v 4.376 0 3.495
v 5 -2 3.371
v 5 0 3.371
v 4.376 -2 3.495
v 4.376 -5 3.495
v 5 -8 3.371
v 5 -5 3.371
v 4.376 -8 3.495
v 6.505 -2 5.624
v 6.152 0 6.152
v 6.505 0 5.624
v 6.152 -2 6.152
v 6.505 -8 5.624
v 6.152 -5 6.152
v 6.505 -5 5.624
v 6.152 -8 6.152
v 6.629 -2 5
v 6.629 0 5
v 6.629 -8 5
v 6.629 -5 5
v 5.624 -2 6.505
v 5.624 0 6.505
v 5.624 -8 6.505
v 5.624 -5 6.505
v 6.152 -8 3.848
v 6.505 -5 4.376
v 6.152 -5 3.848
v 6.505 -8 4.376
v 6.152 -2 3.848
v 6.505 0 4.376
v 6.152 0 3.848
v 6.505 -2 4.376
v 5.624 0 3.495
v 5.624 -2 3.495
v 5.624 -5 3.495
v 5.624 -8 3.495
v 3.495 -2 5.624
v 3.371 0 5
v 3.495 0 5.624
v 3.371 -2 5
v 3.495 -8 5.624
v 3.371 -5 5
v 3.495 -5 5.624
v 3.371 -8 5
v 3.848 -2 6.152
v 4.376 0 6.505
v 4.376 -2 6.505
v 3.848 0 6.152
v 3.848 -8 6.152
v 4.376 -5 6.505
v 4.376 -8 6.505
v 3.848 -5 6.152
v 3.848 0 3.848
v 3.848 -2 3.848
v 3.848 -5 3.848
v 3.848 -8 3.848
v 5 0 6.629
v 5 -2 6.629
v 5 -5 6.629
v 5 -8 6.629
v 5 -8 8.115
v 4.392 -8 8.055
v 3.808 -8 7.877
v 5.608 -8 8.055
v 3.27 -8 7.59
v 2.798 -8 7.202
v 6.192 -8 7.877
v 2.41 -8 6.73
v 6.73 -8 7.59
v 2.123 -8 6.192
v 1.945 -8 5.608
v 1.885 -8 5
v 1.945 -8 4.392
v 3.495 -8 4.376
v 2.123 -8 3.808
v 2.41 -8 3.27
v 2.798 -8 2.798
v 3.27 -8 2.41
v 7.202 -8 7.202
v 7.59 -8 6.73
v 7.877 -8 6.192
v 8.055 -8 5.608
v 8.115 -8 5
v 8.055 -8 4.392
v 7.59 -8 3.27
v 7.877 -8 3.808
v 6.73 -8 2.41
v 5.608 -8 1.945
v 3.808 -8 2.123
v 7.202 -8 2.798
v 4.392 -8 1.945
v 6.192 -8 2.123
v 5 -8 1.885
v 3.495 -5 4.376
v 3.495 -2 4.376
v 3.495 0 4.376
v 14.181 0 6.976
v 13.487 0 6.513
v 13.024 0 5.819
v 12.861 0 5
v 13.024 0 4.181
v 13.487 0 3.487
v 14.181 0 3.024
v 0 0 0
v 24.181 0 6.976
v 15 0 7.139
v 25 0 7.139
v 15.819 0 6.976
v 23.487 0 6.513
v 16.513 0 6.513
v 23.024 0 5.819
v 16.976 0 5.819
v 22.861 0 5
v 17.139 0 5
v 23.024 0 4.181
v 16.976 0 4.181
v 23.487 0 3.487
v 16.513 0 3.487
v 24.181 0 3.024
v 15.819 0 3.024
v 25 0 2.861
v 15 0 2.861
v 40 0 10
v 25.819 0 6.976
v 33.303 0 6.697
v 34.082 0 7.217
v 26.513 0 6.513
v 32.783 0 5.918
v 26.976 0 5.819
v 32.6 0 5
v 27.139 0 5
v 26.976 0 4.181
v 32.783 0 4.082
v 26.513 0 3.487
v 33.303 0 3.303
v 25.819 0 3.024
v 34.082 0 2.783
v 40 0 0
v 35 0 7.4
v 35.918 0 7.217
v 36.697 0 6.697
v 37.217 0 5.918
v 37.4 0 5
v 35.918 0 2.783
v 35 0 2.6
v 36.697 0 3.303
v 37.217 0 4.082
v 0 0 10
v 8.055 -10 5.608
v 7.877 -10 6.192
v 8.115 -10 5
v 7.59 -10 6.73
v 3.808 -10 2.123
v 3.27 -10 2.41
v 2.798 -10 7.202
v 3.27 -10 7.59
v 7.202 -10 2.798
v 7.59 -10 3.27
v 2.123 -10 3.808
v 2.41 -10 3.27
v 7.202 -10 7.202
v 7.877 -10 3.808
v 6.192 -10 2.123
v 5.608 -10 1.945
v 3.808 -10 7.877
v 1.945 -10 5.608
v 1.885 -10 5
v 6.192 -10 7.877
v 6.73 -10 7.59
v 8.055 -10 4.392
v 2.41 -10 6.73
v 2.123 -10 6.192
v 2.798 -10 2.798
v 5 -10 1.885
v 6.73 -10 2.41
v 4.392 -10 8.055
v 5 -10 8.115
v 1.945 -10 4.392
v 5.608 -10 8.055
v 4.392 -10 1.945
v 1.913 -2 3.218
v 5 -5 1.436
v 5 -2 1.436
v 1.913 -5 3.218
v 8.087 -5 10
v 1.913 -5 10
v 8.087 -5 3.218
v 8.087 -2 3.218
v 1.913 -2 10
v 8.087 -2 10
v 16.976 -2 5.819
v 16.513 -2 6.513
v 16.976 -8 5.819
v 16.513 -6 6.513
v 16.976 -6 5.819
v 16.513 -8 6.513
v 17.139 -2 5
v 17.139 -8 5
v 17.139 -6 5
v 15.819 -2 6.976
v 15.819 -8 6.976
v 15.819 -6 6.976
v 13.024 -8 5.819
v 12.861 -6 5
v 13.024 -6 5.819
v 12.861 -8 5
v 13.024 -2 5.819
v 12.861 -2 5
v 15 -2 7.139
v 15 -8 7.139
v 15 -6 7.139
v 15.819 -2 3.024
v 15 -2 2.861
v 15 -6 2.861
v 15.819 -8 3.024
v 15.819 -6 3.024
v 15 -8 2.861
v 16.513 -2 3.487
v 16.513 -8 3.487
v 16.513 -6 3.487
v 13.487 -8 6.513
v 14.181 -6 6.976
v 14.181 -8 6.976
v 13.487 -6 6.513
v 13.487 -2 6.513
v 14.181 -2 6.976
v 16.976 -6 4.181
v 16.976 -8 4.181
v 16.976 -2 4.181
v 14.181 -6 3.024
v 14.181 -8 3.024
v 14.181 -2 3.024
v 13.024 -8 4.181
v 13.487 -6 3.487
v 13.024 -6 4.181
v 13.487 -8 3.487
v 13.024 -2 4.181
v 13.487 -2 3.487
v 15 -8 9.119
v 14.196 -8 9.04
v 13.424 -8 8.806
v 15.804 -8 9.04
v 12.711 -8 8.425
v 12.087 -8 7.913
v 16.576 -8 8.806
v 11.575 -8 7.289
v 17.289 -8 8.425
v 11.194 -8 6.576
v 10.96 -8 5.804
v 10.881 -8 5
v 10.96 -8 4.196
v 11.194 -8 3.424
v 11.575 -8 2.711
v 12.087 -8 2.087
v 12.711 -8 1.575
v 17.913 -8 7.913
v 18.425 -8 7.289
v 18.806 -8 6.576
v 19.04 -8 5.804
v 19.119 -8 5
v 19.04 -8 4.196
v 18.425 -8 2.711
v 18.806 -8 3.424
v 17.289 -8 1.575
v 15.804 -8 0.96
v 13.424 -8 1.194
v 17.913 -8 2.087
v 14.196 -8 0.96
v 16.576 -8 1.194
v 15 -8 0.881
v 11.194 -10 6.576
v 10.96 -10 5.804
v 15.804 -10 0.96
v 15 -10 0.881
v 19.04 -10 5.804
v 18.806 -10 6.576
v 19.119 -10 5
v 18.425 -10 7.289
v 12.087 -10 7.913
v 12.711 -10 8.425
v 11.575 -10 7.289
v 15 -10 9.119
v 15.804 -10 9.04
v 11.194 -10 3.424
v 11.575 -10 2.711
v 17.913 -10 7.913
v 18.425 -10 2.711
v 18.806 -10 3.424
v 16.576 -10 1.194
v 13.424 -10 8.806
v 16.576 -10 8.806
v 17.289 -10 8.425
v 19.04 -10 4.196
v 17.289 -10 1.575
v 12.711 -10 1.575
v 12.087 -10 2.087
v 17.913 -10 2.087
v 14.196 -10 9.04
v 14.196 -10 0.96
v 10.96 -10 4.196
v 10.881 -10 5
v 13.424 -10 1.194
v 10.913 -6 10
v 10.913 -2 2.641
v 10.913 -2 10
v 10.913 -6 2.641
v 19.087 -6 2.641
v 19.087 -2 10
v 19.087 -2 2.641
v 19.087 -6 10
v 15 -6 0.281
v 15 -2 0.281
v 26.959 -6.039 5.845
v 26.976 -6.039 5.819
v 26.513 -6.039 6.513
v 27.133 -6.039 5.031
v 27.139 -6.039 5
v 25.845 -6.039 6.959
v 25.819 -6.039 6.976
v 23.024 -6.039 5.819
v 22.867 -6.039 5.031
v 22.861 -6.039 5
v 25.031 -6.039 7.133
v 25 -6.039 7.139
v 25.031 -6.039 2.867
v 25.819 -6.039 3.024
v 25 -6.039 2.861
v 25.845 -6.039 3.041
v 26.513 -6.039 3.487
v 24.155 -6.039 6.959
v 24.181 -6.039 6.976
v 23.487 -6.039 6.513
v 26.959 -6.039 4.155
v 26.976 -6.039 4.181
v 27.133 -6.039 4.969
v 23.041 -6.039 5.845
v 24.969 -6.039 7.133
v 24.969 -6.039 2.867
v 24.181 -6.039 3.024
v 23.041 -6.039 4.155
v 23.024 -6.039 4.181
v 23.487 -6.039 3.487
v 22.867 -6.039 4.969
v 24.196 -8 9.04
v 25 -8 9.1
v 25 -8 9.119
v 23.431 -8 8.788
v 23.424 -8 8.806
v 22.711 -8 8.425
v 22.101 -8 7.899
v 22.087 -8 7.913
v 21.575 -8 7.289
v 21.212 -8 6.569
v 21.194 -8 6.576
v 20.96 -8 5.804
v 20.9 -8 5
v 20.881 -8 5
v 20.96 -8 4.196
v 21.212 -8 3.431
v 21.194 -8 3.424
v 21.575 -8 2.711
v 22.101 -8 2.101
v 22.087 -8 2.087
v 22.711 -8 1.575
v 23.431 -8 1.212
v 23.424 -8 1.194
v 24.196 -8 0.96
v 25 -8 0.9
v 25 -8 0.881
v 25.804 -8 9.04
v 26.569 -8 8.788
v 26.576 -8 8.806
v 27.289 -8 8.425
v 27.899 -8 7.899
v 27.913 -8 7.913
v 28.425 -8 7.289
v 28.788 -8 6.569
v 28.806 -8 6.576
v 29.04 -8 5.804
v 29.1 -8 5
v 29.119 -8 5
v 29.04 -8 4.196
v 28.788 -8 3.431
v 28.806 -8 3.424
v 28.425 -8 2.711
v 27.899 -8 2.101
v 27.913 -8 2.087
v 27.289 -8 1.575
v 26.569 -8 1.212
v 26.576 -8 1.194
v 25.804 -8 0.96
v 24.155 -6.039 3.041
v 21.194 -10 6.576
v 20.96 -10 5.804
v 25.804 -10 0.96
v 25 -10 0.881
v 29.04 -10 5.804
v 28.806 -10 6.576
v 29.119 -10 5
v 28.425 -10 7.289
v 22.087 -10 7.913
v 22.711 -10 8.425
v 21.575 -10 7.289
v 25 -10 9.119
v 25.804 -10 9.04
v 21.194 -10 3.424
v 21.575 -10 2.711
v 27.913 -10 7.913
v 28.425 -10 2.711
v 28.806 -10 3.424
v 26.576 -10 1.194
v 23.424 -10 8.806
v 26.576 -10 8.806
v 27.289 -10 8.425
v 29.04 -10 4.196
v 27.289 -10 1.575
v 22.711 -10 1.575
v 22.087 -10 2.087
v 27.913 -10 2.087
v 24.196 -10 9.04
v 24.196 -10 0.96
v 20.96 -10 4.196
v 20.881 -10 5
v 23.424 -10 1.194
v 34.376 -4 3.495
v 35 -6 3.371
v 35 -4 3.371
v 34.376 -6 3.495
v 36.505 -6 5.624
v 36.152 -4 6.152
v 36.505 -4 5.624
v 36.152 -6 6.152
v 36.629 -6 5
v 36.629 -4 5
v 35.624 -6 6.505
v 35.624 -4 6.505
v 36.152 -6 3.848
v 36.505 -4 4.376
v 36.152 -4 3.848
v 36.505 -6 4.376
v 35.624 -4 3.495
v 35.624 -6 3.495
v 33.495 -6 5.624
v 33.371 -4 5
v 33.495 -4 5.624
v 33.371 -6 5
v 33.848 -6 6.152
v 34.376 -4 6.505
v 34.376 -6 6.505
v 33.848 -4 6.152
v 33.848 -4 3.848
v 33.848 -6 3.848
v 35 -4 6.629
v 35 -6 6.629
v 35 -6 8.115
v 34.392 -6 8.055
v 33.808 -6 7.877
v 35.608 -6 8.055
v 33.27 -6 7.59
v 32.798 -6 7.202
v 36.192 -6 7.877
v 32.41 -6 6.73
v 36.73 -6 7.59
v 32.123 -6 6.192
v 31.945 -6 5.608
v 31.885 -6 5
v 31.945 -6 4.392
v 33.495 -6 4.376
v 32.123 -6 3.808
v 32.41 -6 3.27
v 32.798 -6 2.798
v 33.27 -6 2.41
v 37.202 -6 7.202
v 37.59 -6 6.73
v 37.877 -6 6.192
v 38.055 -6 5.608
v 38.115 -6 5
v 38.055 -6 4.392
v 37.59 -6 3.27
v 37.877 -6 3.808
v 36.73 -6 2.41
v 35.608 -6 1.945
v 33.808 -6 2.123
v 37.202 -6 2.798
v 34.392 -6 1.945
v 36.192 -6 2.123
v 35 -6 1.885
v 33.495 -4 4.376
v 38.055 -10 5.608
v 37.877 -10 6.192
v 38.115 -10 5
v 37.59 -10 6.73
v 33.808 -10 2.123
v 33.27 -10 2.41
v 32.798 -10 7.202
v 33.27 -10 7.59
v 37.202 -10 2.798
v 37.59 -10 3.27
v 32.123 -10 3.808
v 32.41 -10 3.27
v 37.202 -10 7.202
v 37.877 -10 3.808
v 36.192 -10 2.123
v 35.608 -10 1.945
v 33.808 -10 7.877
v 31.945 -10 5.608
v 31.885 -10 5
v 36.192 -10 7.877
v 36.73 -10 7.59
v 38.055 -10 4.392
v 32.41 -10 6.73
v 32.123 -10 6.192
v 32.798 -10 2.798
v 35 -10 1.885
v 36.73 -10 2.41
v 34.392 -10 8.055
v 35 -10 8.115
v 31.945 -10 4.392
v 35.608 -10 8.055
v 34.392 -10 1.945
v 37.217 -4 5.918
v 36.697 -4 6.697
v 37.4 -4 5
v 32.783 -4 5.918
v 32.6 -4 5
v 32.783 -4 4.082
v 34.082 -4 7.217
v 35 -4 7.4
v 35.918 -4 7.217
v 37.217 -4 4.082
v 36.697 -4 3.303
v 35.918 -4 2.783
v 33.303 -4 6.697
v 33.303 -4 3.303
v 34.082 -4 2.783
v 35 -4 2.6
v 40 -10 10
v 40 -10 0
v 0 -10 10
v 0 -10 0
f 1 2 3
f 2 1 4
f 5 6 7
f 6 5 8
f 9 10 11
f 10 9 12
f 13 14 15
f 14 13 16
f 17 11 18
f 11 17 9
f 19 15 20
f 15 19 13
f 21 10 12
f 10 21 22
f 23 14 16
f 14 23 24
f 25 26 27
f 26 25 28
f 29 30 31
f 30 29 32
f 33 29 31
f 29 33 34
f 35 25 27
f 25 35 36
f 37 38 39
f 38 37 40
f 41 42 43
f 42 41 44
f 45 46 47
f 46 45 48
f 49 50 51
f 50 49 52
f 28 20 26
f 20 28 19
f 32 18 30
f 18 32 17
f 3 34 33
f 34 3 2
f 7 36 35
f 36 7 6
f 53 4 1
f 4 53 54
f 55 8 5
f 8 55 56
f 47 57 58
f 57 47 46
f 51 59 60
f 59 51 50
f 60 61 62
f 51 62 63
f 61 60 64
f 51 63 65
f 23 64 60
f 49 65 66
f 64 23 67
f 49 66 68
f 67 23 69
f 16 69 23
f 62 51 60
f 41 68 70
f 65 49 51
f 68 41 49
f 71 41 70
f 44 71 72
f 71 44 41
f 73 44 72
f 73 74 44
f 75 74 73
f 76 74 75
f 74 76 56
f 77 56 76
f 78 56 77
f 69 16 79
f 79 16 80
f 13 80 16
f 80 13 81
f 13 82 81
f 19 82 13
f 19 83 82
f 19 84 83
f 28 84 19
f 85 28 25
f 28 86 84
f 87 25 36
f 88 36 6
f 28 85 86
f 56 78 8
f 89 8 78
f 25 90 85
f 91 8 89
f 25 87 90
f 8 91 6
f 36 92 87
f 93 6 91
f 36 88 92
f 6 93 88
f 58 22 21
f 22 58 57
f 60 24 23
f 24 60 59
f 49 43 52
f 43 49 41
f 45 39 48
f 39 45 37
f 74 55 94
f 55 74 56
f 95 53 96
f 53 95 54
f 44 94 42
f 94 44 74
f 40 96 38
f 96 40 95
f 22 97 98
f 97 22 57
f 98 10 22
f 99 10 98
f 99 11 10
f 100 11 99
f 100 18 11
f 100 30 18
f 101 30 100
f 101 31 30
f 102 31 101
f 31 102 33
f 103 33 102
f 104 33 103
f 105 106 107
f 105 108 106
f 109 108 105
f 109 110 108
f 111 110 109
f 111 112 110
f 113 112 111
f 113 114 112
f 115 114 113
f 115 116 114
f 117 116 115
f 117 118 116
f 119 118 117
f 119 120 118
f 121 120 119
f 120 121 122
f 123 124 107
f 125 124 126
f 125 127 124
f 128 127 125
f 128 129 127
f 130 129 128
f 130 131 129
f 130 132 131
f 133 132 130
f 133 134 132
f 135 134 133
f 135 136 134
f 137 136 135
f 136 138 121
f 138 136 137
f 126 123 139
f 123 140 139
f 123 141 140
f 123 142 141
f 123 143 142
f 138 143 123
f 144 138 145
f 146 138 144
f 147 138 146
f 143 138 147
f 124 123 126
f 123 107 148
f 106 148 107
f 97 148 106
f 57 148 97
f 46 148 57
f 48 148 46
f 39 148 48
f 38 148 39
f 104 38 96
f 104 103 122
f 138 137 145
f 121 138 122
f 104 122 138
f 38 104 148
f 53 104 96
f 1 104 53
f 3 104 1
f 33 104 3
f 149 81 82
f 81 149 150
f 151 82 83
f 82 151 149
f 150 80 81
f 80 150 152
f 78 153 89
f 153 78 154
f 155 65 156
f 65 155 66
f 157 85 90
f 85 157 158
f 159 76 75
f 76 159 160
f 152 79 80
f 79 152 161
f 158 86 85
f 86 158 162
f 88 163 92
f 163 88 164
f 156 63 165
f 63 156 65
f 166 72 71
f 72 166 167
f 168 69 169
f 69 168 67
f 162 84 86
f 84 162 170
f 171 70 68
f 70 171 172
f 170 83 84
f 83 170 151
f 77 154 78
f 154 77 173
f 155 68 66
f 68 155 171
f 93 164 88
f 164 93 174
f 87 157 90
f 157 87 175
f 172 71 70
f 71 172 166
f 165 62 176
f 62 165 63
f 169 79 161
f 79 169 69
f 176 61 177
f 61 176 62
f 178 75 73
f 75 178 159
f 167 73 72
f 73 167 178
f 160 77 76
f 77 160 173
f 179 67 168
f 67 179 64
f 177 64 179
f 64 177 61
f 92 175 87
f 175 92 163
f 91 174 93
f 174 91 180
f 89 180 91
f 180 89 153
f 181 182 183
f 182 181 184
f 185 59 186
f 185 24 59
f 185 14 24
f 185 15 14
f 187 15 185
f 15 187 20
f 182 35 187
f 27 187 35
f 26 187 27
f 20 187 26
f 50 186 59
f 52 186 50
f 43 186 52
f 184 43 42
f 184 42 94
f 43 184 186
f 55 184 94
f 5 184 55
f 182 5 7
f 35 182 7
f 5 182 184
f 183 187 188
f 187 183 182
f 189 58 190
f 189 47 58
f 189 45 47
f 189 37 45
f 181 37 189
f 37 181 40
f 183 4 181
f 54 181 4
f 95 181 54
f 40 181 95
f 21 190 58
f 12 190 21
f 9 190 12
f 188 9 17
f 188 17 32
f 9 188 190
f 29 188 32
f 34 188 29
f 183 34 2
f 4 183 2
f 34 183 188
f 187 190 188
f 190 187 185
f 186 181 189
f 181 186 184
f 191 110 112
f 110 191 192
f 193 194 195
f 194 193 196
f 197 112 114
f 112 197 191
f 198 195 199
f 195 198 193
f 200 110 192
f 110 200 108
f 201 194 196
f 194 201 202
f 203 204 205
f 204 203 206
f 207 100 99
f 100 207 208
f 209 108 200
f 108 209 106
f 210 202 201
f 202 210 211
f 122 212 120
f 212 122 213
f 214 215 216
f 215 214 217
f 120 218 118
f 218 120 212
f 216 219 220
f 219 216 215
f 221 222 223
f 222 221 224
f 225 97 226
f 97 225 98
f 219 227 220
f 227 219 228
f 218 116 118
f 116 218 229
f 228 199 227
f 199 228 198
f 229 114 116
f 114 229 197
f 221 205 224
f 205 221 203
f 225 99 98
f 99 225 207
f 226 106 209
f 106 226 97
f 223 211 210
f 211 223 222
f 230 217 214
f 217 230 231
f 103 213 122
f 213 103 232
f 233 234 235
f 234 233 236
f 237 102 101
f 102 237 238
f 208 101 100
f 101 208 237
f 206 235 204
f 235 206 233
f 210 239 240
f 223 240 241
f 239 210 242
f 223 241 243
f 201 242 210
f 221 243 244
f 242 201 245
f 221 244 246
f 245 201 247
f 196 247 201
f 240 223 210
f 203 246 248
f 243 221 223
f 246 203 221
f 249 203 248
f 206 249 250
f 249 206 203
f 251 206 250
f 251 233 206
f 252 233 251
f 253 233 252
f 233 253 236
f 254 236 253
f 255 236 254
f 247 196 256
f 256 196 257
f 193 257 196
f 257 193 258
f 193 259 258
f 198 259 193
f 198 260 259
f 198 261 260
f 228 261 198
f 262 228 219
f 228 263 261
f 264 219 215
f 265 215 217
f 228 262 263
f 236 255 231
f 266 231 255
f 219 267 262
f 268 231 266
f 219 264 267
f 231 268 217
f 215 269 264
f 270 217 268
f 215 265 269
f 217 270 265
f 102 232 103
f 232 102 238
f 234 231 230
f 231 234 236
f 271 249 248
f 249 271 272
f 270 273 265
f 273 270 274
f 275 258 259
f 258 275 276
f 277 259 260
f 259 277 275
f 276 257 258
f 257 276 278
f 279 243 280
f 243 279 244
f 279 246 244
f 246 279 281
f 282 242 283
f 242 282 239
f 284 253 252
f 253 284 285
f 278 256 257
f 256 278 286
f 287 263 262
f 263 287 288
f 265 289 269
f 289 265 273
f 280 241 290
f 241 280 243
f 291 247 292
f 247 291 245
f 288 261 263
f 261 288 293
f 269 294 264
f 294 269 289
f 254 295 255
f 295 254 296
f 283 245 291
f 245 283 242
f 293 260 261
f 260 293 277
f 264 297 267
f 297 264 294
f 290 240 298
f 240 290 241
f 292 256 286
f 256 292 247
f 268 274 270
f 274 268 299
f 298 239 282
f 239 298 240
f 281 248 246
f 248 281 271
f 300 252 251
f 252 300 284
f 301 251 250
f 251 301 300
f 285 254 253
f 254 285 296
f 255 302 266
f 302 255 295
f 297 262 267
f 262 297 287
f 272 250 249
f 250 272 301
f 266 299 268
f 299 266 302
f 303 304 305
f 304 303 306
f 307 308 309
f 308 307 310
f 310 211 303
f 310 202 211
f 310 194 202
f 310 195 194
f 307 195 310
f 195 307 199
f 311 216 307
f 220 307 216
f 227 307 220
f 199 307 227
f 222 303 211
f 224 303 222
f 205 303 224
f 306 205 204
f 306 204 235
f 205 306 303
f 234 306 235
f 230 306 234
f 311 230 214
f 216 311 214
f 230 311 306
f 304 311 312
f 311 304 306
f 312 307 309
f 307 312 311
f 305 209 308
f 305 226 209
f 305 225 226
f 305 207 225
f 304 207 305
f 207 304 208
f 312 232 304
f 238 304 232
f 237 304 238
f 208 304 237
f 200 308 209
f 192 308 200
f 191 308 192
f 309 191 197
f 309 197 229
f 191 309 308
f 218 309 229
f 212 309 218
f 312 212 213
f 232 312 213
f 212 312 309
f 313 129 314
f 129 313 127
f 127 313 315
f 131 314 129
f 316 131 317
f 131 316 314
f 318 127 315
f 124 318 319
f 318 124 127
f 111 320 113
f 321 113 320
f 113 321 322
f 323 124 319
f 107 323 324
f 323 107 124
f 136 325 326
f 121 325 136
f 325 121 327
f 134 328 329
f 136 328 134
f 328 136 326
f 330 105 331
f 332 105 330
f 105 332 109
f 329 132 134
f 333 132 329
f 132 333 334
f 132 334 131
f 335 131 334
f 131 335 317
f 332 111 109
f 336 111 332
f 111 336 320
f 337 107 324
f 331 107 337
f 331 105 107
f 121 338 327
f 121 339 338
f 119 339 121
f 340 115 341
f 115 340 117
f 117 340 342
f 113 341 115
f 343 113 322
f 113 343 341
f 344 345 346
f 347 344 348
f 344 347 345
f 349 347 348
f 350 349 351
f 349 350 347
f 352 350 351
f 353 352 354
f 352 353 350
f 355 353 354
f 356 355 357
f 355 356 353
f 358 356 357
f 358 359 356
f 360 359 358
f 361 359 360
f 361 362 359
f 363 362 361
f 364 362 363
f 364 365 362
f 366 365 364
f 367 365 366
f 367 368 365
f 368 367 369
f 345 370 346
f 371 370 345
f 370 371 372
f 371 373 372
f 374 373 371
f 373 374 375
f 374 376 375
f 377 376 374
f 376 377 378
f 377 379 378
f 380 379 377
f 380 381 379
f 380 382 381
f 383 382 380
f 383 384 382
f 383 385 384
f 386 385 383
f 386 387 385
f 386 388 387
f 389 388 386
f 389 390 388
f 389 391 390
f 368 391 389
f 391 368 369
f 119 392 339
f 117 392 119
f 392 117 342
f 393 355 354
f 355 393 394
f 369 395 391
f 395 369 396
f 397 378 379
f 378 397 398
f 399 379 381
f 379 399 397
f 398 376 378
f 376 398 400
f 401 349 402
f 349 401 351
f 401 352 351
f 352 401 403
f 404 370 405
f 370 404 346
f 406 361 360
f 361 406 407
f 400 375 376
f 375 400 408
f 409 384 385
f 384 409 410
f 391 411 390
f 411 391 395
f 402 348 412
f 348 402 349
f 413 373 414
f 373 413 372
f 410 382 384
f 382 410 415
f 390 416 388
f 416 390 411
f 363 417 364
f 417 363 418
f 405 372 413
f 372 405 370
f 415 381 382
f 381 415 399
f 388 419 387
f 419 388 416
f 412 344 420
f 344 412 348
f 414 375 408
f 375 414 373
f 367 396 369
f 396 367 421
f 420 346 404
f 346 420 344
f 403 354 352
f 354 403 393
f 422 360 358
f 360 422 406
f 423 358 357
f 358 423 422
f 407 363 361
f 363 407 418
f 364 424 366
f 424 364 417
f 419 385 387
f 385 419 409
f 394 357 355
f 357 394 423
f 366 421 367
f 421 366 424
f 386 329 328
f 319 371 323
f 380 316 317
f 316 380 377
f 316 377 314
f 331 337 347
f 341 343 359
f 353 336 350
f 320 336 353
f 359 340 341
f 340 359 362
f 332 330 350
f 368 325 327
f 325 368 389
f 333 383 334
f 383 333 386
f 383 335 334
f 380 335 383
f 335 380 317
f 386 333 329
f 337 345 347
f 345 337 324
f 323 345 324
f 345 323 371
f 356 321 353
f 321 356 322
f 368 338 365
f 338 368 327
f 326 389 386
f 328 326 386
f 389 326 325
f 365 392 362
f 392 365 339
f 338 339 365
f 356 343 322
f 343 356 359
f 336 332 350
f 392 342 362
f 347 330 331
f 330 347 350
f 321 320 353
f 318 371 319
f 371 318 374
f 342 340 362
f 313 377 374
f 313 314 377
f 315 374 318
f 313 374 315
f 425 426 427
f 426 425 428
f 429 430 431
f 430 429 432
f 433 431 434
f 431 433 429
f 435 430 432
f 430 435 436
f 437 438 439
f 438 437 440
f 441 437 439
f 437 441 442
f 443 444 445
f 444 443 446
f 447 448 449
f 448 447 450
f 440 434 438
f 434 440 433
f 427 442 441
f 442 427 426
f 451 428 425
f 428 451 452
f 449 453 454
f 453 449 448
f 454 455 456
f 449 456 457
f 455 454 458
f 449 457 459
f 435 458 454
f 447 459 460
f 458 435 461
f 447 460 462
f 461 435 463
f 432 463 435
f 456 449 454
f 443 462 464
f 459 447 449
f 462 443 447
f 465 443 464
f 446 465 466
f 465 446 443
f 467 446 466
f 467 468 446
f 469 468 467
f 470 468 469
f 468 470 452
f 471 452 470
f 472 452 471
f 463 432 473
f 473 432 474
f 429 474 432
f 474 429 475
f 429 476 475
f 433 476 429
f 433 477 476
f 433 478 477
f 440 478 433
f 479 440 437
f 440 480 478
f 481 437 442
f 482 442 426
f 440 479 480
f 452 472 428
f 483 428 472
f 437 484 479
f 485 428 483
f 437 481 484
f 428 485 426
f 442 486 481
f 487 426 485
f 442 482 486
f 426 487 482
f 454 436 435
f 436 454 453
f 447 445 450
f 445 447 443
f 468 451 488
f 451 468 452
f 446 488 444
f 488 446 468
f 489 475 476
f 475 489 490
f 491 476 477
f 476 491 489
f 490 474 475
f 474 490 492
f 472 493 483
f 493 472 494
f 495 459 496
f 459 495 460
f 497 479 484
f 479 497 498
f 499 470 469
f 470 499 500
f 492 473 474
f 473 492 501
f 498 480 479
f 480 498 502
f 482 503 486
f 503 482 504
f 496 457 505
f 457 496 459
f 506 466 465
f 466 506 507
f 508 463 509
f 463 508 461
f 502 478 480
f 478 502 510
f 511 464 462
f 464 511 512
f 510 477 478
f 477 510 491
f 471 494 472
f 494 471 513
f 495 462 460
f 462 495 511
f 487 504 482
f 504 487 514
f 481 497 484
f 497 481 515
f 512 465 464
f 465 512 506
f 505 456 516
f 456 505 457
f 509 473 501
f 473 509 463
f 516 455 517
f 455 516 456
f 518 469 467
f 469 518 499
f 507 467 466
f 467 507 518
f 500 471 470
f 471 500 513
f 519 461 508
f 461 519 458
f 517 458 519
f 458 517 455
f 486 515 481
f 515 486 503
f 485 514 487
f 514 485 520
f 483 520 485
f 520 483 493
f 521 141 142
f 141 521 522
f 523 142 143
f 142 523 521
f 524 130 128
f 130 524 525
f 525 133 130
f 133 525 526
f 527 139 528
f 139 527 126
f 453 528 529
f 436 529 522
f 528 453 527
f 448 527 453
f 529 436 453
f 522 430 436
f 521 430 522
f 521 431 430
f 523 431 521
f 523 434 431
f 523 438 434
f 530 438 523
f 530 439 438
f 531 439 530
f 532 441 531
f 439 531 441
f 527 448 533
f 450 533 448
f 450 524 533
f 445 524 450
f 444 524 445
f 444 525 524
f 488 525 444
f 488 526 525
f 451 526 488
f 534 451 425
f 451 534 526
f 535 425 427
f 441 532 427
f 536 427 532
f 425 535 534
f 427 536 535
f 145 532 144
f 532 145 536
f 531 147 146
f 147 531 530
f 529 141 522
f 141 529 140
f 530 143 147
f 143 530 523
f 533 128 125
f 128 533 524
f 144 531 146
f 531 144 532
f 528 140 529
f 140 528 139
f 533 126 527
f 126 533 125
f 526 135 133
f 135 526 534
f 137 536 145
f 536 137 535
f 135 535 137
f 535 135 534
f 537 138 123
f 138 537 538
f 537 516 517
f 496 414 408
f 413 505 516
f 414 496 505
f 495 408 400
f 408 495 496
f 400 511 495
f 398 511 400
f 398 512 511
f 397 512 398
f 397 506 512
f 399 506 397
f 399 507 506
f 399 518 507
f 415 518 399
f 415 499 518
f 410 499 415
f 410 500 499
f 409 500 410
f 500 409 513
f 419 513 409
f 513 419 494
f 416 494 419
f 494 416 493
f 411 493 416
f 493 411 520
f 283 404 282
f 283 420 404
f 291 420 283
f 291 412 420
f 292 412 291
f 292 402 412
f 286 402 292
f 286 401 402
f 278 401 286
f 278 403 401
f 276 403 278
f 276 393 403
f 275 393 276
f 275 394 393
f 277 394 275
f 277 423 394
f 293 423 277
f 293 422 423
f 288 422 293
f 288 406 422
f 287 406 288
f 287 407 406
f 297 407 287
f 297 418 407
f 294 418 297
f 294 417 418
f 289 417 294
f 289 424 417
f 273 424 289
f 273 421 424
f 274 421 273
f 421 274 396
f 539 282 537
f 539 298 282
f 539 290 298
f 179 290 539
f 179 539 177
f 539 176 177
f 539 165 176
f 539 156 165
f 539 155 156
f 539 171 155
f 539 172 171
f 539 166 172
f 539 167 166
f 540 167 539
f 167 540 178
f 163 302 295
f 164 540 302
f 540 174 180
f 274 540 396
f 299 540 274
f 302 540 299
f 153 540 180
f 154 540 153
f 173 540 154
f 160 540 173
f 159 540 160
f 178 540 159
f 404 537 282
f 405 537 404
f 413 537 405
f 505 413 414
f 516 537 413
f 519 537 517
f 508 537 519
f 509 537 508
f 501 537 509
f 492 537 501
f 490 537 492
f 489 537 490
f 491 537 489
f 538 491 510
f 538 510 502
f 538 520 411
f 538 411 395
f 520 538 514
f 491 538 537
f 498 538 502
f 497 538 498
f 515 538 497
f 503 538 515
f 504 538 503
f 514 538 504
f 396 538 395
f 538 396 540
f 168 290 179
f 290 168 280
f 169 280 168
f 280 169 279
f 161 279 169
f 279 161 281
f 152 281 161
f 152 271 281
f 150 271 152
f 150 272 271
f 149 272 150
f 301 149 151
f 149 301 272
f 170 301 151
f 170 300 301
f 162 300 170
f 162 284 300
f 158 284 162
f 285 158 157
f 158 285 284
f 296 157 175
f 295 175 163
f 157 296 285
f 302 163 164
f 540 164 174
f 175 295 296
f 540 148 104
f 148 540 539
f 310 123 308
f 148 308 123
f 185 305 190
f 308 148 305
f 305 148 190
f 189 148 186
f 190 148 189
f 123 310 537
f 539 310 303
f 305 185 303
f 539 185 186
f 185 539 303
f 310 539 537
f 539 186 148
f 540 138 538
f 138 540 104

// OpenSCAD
$radial_error = 0.1;
$fn = 4*4;

module cylinder_outer(height, radius, fn=$fn, radial_error=$radial_error) {
	fudge = 1/cos(180/fn);
	cylinder(h=height,r=radius*fudge+$radial_error, $fn=fn);
}

module cylinder_inner(height, radius, fn=$fn) {
	cylinder(h=height,r=radius-$radial_error,$fn=fn);
}

// Make a hole. The diameter is the size of the screw (e.g. 3 for M3). Depth is how far the hole should go for the thread, and inset is how far out there should be a hole for the head to go.
module hole(diameter=3, depth=6, inset=10) {
	cylinder_outer(depth, diameter/2);
	translate([0, 0, depth]) cylinder_outer(inset, diameter, 32);
}

module countersunk_hole(diameter=3, depth=6, inset=10) {
	hole(diameter, depth, inset);
	translate([0, 0, depth-diameter/2]) cylinder(r1=diameter/2+$radial_error, r2=diameter+$radial_error, h=diameter/2);
}

module threaded_countersunk_hole(diameter=3, depth=6, inset=10) {
	hole(diameter*0.9, depth, inset);
	translate([0, 0, depth-diameter/2]) cylinder(r1=diameter/2+$radial_error, r2=diameter+$radial_error, h=diameter/2);
}

module knurled_insert(diameter = 3, depth = 6, thickness = 1) {
	cylinder_inner(depth, diameter/2 + thickness);
}

module knurled_hole(diameter = 3, depth = 6, inset = 10, insert = 4, thickness = 1) {
	hole(diameter, depth, inset);
	
	knurled_insert(diameter, insert, thickness);
}

module countersunk_knurled_hole(diameter = 3, depth = 6, inset = 10, insert = 4, thickness = 1) {
	countersunk_hole(diameter, depth, inset);
	
	knurled_insert(diameter, insert, thickness);
}

// Make a hole for a bolt/screw combination.
module bolted_hole(diameter=3, depth=8, nut_offset=2, shaft_length=10, inset=10) {
	hole(diameter, depth, inset);
	hull() {
		shaft_width = diameter;
		translate([0, 0, nut_offset]) rotate(360/12, [0, 0, 1]) cylinder_outer(diameter, shaft_width, 6);
		translate([0, shaft_length, nut_offset]) rotate(360/12, [0, 0, 1]) cylinder_outer(diameter, shaft_width, 6);
	}
}

module countersunk_bolted_hole(diameter=3, depth=8, nut_offset=2, shaft_length=10, inset=10) {
	countersunk_hole(diameter, depth, inset);
	hull() {
		shaft_width = diameter;
		translate([0, 0, nut_offset]) rotate(360/12, [0, 0, 1]) cylinder_outer(diameter, shaft_width, 6);
		translate([0, shaft_length, nut_offset]) rotate(360/12, [0, 0, 1]) cylinder_outer(diameter, shaft_width, 6);
	}
}

module mounting_hole(diameter=3, depth=6, inset=10, outset=3) {
	difference() {
		cylinder_outer(depth, diameter/2+outset);
		hole(diameter=diameter, depth=depth, inset=inset);
	}
}

render() rotate(90, [1, 0, 0]) difference() {
	cube([40, 10, 10]);
	translate([5, 5, 0]) bolted_hole(diameter=3, depth=8);
	translate([15, 5, 0]) bolted_hole(diameter=4, depth=8);
	translate([25, 5, 0]) countersunk_hole(diameter=4, depth=8);
	translate([35, 5, 0]) knurled_hole();
}
